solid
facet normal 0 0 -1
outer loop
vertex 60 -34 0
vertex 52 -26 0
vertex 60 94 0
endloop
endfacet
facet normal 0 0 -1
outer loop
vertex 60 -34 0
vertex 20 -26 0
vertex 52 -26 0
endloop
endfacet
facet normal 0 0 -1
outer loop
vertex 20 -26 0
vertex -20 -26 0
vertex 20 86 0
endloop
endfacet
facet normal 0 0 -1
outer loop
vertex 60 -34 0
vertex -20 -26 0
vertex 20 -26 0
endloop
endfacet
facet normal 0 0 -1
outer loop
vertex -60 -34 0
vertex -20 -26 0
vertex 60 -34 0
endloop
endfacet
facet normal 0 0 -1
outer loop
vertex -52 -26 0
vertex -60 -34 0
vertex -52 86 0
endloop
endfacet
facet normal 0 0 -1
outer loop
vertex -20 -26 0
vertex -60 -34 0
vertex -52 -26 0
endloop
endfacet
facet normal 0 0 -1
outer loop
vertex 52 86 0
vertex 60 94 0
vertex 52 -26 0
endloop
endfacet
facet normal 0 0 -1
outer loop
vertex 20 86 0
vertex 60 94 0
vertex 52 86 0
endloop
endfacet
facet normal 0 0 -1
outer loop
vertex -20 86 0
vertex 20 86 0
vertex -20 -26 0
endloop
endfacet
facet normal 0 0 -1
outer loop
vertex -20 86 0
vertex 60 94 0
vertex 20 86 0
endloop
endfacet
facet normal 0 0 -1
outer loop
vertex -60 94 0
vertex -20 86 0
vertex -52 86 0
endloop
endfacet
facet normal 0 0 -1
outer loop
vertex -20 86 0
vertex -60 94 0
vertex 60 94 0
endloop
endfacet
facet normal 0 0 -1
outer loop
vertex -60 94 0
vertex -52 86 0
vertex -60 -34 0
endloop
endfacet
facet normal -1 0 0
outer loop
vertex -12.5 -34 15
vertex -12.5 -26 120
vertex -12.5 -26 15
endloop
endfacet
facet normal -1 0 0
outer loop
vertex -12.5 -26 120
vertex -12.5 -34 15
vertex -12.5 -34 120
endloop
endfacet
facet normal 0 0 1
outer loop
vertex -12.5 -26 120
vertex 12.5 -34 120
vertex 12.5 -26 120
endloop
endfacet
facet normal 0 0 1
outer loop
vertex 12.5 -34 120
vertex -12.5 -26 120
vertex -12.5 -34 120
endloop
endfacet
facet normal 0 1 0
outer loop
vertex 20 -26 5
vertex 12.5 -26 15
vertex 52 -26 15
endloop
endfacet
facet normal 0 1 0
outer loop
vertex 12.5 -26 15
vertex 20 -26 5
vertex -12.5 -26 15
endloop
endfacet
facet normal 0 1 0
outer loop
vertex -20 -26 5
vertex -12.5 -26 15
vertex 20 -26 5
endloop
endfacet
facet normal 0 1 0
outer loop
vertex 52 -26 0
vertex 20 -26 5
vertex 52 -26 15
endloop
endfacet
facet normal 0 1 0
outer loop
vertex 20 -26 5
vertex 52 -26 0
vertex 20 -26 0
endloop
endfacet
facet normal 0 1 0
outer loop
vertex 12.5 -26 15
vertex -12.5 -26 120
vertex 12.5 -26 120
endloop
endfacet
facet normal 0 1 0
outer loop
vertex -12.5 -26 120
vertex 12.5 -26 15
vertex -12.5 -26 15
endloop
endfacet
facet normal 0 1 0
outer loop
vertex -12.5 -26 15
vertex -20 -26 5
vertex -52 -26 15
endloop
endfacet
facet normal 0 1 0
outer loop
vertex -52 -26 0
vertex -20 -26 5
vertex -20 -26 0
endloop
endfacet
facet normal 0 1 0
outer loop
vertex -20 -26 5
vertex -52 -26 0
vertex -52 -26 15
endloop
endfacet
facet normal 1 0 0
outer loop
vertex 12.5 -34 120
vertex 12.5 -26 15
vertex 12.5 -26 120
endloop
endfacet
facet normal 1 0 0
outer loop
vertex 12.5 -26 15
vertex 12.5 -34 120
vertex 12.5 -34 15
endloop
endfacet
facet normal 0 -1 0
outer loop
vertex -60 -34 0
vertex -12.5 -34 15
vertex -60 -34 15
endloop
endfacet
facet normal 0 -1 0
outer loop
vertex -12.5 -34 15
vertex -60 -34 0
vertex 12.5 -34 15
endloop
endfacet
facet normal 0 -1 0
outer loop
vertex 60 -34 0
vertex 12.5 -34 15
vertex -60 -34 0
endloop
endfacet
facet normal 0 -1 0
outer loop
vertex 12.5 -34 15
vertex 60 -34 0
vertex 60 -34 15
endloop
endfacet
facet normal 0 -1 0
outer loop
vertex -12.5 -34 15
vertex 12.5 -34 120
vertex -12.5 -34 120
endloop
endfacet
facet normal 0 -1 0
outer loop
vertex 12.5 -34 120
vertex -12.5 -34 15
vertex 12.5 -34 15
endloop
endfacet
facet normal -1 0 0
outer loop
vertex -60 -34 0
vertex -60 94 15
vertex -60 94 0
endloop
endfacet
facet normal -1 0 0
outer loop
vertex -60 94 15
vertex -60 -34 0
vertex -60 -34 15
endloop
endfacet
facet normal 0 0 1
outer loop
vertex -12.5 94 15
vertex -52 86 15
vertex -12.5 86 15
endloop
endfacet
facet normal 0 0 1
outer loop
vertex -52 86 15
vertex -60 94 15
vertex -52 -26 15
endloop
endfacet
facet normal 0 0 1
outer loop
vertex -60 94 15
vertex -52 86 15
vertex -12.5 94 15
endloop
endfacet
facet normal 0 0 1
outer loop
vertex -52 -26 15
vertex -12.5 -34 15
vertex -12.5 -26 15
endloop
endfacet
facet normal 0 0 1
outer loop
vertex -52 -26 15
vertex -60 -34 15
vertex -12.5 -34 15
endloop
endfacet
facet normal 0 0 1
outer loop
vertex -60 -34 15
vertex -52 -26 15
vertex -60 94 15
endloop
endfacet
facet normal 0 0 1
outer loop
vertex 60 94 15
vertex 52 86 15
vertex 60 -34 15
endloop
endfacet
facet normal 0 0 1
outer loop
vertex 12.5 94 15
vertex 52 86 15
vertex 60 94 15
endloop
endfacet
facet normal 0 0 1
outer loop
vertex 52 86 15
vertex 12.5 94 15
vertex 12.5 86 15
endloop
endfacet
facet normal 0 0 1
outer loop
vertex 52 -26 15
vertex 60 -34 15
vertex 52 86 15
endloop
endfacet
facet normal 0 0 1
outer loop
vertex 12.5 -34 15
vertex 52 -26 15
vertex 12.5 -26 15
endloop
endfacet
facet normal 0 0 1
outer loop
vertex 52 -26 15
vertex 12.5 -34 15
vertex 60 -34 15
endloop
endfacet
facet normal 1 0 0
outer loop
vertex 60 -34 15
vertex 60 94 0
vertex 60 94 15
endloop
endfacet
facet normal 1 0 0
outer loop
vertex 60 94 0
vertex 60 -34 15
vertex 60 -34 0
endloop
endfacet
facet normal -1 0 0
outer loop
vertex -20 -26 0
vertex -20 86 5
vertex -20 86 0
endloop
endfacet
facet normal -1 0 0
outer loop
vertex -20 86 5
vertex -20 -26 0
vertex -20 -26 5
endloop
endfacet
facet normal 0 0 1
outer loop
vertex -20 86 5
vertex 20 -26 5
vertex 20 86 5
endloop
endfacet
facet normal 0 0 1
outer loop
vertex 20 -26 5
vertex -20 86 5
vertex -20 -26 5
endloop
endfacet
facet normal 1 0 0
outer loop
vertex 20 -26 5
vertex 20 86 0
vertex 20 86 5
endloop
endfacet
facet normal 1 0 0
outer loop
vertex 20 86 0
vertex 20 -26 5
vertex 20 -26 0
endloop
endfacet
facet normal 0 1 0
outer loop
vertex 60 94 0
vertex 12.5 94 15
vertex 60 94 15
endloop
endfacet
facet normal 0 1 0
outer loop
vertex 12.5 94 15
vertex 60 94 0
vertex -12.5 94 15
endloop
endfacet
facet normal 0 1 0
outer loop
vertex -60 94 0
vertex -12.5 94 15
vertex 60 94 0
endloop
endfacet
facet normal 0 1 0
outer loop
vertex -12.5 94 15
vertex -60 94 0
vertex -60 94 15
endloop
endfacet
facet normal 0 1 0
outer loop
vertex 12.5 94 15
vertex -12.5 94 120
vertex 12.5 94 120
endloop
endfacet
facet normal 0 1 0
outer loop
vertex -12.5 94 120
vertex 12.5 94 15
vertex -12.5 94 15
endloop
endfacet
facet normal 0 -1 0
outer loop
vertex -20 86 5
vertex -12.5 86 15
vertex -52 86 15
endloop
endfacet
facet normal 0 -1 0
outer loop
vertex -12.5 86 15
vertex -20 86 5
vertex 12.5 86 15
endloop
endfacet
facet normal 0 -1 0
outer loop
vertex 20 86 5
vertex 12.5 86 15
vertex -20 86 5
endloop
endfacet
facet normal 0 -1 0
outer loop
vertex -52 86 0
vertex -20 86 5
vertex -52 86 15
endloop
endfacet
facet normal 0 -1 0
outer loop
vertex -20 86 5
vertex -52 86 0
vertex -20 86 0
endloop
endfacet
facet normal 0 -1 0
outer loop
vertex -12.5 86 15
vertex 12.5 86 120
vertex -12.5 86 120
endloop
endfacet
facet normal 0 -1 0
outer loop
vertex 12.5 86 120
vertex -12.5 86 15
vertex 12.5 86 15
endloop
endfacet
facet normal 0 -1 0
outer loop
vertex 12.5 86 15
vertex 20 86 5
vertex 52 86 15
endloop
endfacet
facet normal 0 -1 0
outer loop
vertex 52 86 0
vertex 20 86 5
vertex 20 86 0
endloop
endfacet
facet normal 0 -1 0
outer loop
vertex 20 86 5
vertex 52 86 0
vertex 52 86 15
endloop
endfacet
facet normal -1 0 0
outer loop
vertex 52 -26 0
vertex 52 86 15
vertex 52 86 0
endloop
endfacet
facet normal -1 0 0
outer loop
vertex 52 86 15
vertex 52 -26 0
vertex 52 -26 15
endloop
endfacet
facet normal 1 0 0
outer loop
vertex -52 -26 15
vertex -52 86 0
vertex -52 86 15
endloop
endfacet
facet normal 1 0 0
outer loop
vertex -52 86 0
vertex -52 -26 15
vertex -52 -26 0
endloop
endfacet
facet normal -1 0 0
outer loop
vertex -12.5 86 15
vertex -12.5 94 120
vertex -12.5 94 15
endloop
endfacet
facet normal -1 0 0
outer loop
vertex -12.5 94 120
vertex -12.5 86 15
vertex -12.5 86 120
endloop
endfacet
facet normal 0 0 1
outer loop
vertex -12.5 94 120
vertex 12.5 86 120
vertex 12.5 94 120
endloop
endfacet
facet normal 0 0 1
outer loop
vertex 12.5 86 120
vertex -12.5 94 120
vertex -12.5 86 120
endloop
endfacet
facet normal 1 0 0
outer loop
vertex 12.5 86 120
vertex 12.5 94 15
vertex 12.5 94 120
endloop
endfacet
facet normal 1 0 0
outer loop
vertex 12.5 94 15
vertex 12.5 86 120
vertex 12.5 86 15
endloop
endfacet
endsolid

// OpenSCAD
color("red")
    translate([0, -30, 0])
        linear_extrude(height = 120)
            square([25, 8], center = true);
color("red")
    translate([0, -30, 0])
        linear_extrude(height = 15)
            square([120, 8], center = true);
color("red")
    translate([0, 30, 0])
        linear_extrude(height = 5)
            square([40, 120], center = true);

color("red")
    translate([0, 90, 0])
        linear_extrude(height = 15)
            square([120, 8], center = true);
color("red")
    translate([56, 30, 0])
        linear_extrude(height = 15)
            square([8, 120], center = true);
color("red")
    translate([-56, 30, 0])
        linear_extrude(height = 15)
            square([8, 120], center = true);            
color("red")
    translate([0, 90, 0])
        linear_extrude(height = 120)
            square([25, 8], center = true);
